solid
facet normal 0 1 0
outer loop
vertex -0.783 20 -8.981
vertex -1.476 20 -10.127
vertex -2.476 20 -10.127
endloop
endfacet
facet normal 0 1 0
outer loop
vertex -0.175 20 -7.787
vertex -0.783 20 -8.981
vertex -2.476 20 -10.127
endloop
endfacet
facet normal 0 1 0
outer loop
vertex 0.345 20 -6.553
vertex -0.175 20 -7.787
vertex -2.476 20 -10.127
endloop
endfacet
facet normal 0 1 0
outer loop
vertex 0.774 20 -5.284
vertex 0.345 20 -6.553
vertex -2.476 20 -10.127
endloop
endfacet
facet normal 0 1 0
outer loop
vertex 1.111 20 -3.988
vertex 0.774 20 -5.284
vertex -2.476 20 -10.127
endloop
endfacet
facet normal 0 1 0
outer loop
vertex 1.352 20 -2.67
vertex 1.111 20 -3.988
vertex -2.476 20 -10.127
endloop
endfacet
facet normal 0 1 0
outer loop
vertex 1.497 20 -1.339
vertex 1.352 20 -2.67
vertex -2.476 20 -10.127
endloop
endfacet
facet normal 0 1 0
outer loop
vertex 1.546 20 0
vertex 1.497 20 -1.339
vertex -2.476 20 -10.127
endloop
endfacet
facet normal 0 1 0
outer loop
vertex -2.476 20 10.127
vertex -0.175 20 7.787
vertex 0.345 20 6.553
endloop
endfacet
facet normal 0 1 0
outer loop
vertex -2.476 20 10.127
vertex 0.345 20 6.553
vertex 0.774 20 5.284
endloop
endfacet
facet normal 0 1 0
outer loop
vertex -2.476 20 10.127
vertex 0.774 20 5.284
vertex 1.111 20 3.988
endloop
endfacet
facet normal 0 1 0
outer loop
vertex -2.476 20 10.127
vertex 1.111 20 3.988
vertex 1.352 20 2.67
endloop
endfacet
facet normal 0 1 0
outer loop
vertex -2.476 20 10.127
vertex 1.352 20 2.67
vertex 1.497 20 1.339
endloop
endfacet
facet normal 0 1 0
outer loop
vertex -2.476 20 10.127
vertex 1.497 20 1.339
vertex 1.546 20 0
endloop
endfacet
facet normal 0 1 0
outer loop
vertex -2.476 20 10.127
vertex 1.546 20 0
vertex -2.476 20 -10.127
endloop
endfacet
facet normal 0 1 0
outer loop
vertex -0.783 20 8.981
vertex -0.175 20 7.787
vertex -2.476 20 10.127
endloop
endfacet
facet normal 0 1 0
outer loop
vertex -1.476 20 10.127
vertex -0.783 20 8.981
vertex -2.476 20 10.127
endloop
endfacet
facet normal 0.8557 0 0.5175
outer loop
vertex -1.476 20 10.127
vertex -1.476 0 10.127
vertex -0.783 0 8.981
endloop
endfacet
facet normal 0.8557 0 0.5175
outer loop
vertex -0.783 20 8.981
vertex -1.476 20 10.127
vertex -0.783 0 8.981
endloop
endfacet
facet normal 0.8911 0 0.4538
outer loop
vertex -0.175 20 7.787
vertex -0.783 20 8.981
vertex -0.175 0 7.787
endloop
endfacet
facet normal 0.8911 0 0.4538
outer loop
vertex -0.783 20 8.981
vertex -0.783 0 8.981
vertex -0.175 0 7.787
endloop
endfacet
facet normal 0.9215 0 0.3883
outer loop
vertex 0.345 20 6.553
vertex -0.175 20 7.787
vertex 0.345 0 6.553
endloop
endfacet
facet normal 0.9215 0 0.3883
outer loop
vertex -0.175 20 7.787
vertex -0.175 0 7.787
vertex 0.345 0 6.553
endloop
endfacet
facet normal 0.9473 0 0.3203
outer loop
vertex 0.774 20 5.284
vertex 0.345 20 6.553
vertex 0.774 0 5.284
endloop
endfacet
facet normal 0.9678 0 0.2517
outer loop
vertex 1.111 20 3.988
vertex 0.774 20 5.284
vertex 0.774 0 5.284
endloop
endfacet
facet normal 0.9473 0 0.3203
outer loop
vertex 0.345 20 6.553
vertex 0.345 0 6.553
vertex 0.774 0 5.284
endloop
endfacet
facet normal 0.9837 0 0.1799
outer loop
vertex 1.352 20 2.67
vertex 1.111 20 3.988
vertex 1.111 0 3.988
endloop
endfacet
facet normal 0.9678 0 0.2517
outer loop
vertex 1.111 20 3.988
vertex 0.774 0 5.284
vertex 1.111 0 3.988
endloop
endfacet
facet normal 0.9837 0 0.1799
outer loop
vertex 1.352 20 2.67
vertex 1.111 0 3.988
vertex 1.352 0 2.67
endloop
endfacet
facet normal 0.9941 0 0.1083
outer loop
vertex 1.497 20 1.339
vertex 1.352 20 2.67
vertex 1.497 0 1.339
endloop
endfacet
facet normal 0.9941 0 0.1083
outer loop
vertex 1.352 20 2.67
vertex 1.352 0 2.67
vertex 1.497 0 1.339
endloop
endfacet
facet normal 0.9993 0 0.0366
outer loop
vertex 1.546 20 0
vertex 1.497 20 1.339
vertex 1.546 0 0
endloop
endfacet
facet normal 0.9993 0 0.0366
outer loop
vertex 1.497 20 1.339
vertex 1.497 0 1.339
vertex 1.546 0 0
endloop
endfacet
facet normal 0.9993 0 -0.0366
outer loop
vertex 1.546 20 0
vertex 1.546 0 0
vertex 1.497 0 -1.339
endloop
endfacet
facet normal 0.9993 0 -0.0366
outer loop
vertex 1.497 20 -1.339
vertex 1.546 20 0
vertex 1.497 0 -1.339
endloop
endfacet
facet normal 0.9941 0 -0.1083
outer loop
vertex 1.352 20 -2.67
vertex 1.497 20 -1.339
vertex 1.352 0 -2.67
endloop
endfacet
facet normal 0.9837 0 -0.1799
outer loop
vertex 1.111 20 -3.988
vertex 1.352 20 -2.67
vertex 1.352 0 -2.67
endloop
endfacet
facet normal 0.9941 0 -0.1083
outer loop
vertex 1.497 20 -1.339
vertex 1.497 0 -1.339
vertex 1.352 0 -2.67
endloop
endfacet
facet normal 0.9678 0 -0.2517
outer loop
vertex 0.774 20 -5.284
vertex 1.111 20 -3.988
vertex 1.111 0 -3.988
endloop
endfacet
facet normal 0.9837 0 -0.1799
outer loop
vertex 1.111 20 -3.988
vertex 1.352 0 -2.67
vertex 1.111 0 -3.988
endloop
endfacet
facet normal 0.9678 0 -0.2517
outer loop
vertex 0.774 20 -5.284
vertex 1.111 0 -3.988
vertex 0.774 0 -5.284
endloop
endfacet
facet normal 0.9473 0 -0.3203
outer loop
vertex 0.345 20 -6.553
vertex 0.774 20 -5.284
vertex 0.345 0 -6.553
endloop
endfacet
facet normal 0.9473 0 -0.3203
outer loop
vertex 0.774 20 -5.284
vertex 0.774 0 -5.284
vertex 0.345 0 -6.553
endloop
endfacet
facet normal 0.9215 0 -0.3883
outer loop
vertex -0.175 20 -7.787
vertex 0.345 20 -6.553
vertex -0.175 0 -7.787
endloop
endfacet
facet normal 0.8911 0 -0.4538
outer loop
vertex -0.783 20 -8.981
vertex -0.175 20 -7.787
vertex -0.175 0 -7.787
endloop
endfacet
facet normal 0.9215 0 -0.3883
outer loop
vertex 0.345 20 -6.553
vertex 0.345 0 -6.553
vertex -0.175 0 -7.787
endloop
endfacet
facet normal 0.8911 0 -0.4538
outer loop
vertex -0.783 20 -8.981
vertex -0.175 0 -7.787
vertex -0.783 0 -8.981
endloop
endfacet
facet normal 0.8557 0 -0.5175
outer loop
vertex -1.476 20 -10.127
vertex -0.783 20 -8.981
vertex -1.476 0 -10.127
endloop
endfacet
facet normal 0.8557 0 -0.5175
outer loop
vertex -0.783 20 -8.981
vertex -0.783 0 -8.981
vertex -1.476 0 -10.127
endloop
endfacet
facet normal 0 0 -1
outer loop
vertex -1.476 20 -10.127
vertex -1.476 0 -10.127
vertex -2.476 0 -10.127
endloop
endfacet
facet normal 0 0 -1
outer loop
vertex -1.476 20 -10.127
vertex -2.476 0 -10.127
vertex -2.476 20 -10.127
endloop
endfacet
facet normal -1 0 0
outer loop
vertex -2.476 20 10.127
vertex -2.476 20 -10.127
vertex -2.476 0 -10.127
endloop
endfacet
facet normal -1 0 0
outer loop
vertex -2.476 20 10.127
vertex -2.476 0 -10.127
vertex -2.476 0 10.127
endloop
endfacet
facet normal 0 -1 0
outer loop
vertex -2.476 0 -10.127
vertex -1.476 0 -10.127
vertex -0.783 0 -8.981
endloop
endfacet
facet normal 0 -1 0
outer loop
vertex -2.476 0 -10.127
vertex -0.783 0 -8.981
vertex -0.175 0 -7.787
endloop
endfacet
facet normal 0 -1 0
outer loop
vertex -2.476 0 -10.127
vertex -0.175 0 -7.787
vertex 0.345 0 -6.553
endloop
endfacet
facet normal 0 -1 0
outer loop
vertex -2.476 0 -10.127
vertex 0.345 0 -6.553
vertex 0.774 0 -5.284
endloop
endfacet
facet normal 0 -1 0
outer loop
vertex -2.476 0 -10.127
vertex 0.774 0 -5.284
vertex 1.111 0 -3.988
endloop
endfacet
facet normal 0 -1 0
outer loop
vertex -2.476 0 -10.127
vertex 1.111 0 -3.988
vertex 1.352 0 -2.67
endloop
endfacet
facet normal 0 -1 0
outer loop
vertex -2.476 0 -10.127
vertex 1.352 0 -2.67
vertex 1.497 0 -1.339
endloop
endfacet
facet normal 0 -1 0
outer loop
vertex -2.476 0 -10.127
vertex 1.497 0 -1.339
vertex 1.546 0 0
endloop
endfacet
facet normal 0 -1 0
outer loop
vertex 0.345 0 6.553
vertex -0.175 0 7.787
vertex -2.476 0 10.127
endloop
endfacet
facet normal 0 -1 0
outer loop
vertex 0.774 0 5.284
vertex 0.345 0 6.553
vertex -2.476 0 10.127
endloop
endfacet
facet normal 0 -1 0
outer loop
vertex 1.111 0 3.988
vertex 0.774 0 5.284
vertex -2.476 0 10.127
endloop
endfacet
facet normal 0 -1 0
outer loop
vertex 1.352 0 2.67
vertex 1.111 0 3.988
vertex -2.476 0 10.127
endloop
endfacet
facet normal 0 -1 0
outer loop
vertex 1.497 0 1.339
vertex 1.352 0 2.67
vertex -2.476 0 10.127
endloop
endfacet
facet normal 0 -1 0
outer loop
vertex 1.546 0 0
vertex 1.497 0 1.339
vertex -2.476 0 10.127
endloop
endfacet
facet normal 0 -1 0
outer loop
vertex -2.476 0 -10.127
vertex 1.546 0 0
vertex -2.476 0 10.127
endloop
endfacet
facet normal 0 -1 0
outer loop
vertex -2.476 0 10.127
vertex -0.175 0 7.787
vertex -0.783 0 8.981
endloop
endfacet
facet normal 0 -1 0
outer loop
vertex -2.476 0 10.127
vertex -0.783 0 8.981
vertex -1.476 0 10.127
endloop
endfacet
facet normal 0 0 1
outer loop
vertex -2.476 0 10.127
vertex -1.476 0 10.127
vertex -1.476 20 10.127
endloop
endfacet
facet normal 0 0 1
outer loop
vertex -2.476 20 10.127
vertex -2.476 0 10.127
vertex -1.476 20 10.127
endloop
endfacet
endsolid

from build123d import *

# Parameters (mm, degrees)
EXTRUDE_1_DEPTH = 20
SKETCH_2_W      = 20.253995302
SKETCH_2_H      = 20
EXTRUDE_2_DEPTH = 1


with BuildPart() as part:
    # 草图1 → 凸台-拉伸1 (new body)
    with BuildSketch(Plane(origin=(0, 0, 0), x_dir=(1, 0, 0), z_dir=(0, 1, 0))):
        with BuildLine():
            ThreePointArc((1.545950546, 0), (0.774439181, 5.28408774), (-1.475680066, 10.126997651))
            Line((-1.475680066, 10.126997651), (-1.475680066, -10.126997651))
            ThreePointArc((-1.475680066, -10.126997651), (0.774439181, -5.28408774), (1.545950546, 0))
        make_face()
    extrude(amount=EXTRUDE_1_DEPTH)

    # 草图2 → 凸台-拉伸2 (add)
    with BuildSketch(Plane.ZY.offset(1.475680066)):
        with Locations((0, 10)):
            Rectangle(SKETCH_2_W, SKETCH_2_H)
    extrude(amount=EXTRUDE_2_DEPTH)


solid = part.part
